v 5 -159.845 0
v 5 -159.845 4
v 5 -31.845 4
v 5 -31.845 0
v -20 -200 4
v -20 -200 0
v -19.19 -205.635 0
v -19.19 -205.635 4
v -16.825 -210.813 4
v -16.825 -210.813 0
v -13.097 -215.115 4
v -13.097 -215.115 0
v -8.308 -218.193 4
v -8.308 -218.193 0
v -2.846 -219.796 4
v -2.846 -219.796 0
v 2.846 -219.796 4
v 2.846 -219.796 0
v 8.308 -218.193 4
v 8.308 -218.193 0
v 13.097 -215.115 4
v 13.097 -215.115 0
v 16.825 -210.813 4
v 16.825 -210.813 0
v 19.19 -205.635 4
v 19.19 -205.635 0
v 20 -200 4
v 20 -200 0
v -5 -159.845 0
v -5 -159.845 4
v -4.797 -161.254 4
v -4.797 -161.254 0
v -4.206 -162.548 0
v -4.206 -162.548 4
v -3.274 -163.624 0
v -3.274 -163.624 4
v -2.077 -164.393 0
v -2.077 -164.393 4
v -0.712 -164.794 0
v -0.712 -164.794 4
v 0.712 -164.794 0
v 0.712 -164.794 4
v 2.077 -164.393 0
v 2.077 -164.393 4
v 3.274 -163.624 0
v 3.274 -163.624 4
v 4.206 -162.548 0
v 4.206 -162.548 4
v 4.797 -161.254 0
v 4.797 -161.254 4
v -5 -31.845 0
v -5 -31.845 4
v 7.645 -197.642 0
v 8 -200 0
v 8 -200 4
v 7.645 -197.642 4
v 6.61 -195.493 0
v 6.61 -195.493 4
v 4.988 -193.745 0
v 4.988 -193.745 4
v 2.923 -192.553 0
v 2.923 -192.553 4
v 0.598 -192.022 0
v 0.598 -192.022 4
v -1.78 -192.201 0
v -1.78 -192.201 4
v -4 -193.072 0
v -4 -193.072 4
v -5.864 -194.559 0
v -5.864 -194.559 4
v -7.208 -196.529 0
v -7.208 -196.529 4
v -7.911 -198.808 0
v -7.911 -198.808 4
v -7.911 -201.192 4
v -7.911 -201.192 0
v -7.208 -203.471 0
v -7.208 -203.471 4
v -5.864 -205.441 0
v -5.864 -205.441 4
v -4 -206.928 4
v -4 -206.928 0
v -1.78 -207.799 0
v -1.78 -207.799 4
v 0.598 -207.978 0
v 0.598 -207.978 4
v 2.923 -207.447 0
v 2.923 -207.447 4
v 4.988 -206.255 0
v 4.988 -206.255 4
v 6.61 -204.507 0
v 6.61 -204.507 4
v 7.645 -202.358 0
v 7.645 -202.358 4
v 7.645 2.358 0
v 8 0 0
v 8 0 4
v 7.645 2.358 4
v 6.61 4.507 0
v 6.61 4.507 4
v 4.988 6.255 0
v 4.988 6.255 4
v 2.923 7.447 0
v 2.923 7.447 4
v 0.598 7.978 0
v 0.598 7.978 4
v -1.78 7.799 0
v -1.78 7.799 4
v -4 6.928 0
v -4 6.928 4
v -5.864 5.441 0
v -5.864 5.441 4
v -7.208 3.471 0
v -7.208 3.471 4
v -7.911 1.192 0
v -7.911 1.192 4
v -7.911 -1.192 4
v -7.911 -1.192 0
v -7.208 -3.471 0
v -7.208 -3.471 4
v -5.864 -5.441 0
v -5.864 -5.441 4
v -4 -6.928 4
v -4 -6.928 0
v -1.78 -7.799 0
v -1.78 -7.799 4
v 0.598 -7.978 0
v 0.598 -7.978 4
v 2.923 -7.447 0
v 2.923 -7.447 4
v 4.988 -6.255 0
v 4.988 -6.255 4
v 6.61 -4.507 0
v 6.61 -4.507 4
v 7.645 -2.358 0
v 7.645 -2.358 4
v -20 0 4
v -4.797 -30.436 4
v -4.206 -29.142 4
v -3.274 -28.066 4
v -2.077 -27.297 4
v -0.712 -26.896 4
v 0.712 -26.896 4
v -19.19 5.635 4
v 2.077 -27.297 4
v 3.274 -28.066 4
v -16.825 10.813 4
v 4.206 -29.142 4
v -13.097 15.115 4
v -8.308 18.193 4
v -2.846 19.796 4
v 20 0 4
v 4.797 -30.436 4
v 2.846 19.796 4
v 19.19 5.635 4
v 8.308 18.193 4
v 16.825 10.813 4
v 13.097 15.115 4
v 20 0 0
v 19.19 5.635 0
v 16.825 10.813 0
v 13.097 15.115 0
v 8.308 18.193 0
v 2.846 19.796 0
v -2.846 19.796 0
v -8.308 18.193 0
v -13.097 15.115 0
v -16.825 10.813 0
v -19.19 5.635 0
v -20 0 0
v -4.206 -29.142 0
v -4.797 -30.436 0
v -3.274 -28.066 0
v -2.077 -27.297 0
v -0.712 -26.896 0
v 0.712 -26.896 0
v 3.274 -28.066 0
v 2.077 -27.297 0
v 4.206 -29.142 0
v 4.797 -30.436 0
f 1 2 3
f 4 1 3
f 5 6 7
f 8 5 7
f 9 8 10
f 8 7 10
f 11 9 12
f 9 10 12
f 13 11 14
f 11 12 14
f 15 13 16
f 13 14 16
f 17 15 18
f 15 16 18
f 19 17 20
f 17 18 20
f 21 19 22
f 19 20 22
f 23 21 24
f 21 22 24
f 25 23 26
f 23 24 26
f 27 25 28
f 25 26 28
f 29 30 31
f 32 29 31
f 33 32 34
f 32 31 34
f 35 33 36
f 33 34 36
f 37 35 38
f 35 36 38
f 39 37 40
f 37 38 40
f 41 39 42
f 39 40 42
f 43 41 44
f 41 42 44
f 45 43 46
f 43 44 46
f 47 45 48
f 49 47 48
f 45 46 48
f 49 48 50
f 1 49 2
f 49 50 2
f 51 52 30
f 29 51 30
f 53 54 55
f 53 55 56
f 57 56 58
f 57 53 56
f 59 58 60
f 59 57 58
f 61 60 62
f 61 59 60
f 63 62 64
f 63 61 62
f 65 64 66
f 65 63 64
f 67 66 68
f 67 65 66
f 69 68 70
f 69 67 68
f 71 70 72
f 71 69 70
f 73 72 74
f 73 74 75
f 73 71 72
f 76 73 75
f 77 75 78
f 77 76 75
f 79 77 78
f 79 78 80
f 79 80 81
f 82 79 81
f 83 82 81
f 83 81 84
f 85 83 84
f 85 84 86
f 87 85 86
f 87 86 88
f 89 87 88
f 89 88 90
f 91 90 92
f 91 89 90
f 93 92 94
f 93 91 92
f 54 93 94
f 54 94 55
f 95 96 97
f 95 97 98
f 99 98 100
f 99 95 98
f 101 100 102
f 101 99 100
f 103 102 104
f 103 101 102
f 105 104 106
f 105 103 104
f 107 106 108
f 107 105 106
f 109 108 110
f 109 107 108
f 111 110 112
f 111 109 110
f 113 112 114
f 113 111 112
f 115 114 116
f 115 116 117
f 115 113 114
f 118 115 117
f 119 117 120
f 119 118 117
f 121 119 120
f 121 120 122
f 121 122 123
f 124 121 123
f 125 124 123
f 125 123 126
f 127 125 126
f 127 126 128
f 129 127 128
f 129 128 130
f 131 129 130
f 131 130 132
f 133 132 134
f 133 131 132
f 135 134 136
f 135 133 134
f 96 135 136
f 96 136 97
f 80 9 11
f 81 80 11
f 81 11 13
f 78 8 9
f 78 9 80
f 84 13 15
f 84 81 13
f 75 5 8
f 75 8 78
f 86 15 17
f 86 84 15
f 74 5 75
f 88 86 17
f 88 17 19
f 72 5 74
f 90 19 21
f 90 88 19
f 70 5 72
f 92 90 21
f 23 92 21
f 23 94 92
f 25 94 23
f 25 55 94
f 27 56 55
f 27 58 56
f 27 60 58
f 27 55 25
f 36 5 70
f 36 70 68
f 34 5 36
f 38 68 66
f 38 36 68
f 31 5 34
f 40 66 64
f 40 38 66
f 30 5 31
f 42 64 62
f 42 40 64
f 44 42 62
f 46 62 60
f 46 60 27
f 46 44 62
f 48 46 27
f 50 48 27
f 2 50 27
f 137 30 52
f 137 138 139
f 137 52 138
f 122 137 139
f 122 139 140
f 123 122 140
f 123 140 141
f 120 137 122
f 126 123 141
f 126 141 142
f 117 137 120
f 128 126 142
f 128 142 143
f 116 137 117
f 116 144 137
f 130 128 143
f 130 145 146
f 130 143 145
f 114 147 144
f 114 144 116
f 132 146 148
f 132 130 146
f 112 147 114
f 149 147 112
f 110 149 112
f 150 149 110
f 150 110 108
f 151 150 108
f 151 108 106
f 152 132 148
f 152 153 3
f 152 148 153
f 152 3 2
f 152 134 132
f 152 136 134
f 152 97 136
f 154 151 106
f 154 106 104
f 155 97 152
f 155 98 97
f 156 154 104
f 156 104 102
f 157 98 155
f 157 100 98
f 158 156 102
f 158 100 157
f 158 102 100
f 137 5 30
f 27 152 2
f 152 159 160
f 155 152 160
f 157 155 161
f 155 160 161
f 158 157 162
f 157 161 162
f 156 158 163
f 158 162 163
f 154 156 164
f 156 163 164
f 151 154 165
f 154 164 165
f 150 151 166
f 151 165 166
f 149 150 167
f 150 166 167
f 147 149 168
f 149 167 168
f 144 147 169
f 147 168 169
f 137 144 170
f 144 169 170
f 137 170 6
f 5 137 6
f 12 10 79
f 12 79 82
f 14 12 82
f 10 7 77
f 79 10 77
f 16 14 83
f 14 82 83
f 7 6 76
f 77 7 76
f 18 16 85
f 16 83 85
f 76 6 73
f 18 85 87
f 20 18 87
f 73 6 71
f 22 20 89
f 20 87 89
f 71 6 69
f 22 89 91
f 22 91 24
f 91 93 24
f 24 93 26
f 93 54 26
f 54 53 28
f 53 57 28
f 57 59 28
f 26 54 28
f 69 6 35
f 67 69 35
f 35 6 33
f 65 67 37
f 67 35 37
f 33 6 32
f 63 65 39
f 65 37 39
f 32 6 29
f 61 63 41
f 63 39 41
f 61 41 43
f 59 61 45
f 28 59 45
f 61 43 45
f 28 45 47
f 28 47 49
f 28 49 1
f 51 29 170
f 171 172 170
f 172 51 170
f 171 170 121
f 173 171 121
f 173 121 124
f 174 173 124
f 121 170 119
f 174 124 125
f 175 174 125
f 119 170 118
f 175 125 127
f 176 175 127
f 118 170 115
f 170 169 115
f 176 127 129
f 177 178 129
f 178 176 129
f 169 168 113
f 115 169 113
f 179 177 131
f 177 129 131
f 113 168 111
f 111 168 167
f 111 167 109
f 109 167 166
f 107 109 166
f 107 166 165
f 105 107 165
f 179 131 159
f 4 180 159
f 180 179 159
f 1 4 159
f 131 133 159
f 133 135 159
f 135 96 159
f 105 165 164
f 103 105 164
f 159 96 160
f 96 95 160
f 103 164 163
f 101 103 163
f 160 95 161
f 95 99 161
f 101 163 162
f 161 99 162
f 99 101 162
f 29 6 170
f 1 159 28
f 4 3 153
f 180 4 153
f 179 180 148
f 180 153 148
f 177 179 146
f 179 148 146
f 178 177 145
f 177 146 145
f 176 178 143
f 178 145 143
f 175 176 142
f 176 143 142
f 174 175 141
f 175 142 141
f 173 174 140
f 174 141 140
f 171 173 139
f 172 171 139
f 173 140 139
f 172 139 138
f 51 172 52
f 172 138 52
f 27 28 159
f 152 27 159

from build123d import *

# Parameters (mm, degrees)
SKETCH_1_R          = 8
EXTRUDE_1_DEPTH     = 4
CUT_EXTRUDE_2_DEPTH = 221.943431674


with BuildPart() as part:
    # 草图1 → 凸台-拉伸1 (new body)
    with BuildSketch(Plane.XY):
        with BuildLine():
            Line((-20, 0), (-20, -200))
            ThreePointArc((-20, -200), (0, -220), (20, -200))
            Line((20, -200), (20, 0))
            ThreePointArc((20, 0), (0, 20), (-20, 0))
        make_face()
        Circle(SKETCH_1_R, mode=Mode.SUBTRACT)
        with Locations((0, -200)):
            Circle(SKETCH_1_R, mode=Mode.SUBTRACT)
    extrude(amount=EXTRUDE_1_DEPTH)

    # 草图2 → 切除-拉伸2 (cut, through all)
    with BuildSketch(Plane.XY.offset(4)):
        with BuildLine():
            Line((-5, -31.845004689), (-5, -159.845004689))
            ThreePointArc((-5, -159.845004689), (0, -164.845004689), (5, -159.845004689))
            Line((5, -159.845004689), (5, -31.845004689))
            ThreePointArc((5, -31.845004689), (0, -26.845004689), (-5, -31.845004689))
        make_face()
    extrude(amount=-CUT_EXTRUDE_2_DEPTH, mode=Mode.SUBTRACT)


solid = part.part
